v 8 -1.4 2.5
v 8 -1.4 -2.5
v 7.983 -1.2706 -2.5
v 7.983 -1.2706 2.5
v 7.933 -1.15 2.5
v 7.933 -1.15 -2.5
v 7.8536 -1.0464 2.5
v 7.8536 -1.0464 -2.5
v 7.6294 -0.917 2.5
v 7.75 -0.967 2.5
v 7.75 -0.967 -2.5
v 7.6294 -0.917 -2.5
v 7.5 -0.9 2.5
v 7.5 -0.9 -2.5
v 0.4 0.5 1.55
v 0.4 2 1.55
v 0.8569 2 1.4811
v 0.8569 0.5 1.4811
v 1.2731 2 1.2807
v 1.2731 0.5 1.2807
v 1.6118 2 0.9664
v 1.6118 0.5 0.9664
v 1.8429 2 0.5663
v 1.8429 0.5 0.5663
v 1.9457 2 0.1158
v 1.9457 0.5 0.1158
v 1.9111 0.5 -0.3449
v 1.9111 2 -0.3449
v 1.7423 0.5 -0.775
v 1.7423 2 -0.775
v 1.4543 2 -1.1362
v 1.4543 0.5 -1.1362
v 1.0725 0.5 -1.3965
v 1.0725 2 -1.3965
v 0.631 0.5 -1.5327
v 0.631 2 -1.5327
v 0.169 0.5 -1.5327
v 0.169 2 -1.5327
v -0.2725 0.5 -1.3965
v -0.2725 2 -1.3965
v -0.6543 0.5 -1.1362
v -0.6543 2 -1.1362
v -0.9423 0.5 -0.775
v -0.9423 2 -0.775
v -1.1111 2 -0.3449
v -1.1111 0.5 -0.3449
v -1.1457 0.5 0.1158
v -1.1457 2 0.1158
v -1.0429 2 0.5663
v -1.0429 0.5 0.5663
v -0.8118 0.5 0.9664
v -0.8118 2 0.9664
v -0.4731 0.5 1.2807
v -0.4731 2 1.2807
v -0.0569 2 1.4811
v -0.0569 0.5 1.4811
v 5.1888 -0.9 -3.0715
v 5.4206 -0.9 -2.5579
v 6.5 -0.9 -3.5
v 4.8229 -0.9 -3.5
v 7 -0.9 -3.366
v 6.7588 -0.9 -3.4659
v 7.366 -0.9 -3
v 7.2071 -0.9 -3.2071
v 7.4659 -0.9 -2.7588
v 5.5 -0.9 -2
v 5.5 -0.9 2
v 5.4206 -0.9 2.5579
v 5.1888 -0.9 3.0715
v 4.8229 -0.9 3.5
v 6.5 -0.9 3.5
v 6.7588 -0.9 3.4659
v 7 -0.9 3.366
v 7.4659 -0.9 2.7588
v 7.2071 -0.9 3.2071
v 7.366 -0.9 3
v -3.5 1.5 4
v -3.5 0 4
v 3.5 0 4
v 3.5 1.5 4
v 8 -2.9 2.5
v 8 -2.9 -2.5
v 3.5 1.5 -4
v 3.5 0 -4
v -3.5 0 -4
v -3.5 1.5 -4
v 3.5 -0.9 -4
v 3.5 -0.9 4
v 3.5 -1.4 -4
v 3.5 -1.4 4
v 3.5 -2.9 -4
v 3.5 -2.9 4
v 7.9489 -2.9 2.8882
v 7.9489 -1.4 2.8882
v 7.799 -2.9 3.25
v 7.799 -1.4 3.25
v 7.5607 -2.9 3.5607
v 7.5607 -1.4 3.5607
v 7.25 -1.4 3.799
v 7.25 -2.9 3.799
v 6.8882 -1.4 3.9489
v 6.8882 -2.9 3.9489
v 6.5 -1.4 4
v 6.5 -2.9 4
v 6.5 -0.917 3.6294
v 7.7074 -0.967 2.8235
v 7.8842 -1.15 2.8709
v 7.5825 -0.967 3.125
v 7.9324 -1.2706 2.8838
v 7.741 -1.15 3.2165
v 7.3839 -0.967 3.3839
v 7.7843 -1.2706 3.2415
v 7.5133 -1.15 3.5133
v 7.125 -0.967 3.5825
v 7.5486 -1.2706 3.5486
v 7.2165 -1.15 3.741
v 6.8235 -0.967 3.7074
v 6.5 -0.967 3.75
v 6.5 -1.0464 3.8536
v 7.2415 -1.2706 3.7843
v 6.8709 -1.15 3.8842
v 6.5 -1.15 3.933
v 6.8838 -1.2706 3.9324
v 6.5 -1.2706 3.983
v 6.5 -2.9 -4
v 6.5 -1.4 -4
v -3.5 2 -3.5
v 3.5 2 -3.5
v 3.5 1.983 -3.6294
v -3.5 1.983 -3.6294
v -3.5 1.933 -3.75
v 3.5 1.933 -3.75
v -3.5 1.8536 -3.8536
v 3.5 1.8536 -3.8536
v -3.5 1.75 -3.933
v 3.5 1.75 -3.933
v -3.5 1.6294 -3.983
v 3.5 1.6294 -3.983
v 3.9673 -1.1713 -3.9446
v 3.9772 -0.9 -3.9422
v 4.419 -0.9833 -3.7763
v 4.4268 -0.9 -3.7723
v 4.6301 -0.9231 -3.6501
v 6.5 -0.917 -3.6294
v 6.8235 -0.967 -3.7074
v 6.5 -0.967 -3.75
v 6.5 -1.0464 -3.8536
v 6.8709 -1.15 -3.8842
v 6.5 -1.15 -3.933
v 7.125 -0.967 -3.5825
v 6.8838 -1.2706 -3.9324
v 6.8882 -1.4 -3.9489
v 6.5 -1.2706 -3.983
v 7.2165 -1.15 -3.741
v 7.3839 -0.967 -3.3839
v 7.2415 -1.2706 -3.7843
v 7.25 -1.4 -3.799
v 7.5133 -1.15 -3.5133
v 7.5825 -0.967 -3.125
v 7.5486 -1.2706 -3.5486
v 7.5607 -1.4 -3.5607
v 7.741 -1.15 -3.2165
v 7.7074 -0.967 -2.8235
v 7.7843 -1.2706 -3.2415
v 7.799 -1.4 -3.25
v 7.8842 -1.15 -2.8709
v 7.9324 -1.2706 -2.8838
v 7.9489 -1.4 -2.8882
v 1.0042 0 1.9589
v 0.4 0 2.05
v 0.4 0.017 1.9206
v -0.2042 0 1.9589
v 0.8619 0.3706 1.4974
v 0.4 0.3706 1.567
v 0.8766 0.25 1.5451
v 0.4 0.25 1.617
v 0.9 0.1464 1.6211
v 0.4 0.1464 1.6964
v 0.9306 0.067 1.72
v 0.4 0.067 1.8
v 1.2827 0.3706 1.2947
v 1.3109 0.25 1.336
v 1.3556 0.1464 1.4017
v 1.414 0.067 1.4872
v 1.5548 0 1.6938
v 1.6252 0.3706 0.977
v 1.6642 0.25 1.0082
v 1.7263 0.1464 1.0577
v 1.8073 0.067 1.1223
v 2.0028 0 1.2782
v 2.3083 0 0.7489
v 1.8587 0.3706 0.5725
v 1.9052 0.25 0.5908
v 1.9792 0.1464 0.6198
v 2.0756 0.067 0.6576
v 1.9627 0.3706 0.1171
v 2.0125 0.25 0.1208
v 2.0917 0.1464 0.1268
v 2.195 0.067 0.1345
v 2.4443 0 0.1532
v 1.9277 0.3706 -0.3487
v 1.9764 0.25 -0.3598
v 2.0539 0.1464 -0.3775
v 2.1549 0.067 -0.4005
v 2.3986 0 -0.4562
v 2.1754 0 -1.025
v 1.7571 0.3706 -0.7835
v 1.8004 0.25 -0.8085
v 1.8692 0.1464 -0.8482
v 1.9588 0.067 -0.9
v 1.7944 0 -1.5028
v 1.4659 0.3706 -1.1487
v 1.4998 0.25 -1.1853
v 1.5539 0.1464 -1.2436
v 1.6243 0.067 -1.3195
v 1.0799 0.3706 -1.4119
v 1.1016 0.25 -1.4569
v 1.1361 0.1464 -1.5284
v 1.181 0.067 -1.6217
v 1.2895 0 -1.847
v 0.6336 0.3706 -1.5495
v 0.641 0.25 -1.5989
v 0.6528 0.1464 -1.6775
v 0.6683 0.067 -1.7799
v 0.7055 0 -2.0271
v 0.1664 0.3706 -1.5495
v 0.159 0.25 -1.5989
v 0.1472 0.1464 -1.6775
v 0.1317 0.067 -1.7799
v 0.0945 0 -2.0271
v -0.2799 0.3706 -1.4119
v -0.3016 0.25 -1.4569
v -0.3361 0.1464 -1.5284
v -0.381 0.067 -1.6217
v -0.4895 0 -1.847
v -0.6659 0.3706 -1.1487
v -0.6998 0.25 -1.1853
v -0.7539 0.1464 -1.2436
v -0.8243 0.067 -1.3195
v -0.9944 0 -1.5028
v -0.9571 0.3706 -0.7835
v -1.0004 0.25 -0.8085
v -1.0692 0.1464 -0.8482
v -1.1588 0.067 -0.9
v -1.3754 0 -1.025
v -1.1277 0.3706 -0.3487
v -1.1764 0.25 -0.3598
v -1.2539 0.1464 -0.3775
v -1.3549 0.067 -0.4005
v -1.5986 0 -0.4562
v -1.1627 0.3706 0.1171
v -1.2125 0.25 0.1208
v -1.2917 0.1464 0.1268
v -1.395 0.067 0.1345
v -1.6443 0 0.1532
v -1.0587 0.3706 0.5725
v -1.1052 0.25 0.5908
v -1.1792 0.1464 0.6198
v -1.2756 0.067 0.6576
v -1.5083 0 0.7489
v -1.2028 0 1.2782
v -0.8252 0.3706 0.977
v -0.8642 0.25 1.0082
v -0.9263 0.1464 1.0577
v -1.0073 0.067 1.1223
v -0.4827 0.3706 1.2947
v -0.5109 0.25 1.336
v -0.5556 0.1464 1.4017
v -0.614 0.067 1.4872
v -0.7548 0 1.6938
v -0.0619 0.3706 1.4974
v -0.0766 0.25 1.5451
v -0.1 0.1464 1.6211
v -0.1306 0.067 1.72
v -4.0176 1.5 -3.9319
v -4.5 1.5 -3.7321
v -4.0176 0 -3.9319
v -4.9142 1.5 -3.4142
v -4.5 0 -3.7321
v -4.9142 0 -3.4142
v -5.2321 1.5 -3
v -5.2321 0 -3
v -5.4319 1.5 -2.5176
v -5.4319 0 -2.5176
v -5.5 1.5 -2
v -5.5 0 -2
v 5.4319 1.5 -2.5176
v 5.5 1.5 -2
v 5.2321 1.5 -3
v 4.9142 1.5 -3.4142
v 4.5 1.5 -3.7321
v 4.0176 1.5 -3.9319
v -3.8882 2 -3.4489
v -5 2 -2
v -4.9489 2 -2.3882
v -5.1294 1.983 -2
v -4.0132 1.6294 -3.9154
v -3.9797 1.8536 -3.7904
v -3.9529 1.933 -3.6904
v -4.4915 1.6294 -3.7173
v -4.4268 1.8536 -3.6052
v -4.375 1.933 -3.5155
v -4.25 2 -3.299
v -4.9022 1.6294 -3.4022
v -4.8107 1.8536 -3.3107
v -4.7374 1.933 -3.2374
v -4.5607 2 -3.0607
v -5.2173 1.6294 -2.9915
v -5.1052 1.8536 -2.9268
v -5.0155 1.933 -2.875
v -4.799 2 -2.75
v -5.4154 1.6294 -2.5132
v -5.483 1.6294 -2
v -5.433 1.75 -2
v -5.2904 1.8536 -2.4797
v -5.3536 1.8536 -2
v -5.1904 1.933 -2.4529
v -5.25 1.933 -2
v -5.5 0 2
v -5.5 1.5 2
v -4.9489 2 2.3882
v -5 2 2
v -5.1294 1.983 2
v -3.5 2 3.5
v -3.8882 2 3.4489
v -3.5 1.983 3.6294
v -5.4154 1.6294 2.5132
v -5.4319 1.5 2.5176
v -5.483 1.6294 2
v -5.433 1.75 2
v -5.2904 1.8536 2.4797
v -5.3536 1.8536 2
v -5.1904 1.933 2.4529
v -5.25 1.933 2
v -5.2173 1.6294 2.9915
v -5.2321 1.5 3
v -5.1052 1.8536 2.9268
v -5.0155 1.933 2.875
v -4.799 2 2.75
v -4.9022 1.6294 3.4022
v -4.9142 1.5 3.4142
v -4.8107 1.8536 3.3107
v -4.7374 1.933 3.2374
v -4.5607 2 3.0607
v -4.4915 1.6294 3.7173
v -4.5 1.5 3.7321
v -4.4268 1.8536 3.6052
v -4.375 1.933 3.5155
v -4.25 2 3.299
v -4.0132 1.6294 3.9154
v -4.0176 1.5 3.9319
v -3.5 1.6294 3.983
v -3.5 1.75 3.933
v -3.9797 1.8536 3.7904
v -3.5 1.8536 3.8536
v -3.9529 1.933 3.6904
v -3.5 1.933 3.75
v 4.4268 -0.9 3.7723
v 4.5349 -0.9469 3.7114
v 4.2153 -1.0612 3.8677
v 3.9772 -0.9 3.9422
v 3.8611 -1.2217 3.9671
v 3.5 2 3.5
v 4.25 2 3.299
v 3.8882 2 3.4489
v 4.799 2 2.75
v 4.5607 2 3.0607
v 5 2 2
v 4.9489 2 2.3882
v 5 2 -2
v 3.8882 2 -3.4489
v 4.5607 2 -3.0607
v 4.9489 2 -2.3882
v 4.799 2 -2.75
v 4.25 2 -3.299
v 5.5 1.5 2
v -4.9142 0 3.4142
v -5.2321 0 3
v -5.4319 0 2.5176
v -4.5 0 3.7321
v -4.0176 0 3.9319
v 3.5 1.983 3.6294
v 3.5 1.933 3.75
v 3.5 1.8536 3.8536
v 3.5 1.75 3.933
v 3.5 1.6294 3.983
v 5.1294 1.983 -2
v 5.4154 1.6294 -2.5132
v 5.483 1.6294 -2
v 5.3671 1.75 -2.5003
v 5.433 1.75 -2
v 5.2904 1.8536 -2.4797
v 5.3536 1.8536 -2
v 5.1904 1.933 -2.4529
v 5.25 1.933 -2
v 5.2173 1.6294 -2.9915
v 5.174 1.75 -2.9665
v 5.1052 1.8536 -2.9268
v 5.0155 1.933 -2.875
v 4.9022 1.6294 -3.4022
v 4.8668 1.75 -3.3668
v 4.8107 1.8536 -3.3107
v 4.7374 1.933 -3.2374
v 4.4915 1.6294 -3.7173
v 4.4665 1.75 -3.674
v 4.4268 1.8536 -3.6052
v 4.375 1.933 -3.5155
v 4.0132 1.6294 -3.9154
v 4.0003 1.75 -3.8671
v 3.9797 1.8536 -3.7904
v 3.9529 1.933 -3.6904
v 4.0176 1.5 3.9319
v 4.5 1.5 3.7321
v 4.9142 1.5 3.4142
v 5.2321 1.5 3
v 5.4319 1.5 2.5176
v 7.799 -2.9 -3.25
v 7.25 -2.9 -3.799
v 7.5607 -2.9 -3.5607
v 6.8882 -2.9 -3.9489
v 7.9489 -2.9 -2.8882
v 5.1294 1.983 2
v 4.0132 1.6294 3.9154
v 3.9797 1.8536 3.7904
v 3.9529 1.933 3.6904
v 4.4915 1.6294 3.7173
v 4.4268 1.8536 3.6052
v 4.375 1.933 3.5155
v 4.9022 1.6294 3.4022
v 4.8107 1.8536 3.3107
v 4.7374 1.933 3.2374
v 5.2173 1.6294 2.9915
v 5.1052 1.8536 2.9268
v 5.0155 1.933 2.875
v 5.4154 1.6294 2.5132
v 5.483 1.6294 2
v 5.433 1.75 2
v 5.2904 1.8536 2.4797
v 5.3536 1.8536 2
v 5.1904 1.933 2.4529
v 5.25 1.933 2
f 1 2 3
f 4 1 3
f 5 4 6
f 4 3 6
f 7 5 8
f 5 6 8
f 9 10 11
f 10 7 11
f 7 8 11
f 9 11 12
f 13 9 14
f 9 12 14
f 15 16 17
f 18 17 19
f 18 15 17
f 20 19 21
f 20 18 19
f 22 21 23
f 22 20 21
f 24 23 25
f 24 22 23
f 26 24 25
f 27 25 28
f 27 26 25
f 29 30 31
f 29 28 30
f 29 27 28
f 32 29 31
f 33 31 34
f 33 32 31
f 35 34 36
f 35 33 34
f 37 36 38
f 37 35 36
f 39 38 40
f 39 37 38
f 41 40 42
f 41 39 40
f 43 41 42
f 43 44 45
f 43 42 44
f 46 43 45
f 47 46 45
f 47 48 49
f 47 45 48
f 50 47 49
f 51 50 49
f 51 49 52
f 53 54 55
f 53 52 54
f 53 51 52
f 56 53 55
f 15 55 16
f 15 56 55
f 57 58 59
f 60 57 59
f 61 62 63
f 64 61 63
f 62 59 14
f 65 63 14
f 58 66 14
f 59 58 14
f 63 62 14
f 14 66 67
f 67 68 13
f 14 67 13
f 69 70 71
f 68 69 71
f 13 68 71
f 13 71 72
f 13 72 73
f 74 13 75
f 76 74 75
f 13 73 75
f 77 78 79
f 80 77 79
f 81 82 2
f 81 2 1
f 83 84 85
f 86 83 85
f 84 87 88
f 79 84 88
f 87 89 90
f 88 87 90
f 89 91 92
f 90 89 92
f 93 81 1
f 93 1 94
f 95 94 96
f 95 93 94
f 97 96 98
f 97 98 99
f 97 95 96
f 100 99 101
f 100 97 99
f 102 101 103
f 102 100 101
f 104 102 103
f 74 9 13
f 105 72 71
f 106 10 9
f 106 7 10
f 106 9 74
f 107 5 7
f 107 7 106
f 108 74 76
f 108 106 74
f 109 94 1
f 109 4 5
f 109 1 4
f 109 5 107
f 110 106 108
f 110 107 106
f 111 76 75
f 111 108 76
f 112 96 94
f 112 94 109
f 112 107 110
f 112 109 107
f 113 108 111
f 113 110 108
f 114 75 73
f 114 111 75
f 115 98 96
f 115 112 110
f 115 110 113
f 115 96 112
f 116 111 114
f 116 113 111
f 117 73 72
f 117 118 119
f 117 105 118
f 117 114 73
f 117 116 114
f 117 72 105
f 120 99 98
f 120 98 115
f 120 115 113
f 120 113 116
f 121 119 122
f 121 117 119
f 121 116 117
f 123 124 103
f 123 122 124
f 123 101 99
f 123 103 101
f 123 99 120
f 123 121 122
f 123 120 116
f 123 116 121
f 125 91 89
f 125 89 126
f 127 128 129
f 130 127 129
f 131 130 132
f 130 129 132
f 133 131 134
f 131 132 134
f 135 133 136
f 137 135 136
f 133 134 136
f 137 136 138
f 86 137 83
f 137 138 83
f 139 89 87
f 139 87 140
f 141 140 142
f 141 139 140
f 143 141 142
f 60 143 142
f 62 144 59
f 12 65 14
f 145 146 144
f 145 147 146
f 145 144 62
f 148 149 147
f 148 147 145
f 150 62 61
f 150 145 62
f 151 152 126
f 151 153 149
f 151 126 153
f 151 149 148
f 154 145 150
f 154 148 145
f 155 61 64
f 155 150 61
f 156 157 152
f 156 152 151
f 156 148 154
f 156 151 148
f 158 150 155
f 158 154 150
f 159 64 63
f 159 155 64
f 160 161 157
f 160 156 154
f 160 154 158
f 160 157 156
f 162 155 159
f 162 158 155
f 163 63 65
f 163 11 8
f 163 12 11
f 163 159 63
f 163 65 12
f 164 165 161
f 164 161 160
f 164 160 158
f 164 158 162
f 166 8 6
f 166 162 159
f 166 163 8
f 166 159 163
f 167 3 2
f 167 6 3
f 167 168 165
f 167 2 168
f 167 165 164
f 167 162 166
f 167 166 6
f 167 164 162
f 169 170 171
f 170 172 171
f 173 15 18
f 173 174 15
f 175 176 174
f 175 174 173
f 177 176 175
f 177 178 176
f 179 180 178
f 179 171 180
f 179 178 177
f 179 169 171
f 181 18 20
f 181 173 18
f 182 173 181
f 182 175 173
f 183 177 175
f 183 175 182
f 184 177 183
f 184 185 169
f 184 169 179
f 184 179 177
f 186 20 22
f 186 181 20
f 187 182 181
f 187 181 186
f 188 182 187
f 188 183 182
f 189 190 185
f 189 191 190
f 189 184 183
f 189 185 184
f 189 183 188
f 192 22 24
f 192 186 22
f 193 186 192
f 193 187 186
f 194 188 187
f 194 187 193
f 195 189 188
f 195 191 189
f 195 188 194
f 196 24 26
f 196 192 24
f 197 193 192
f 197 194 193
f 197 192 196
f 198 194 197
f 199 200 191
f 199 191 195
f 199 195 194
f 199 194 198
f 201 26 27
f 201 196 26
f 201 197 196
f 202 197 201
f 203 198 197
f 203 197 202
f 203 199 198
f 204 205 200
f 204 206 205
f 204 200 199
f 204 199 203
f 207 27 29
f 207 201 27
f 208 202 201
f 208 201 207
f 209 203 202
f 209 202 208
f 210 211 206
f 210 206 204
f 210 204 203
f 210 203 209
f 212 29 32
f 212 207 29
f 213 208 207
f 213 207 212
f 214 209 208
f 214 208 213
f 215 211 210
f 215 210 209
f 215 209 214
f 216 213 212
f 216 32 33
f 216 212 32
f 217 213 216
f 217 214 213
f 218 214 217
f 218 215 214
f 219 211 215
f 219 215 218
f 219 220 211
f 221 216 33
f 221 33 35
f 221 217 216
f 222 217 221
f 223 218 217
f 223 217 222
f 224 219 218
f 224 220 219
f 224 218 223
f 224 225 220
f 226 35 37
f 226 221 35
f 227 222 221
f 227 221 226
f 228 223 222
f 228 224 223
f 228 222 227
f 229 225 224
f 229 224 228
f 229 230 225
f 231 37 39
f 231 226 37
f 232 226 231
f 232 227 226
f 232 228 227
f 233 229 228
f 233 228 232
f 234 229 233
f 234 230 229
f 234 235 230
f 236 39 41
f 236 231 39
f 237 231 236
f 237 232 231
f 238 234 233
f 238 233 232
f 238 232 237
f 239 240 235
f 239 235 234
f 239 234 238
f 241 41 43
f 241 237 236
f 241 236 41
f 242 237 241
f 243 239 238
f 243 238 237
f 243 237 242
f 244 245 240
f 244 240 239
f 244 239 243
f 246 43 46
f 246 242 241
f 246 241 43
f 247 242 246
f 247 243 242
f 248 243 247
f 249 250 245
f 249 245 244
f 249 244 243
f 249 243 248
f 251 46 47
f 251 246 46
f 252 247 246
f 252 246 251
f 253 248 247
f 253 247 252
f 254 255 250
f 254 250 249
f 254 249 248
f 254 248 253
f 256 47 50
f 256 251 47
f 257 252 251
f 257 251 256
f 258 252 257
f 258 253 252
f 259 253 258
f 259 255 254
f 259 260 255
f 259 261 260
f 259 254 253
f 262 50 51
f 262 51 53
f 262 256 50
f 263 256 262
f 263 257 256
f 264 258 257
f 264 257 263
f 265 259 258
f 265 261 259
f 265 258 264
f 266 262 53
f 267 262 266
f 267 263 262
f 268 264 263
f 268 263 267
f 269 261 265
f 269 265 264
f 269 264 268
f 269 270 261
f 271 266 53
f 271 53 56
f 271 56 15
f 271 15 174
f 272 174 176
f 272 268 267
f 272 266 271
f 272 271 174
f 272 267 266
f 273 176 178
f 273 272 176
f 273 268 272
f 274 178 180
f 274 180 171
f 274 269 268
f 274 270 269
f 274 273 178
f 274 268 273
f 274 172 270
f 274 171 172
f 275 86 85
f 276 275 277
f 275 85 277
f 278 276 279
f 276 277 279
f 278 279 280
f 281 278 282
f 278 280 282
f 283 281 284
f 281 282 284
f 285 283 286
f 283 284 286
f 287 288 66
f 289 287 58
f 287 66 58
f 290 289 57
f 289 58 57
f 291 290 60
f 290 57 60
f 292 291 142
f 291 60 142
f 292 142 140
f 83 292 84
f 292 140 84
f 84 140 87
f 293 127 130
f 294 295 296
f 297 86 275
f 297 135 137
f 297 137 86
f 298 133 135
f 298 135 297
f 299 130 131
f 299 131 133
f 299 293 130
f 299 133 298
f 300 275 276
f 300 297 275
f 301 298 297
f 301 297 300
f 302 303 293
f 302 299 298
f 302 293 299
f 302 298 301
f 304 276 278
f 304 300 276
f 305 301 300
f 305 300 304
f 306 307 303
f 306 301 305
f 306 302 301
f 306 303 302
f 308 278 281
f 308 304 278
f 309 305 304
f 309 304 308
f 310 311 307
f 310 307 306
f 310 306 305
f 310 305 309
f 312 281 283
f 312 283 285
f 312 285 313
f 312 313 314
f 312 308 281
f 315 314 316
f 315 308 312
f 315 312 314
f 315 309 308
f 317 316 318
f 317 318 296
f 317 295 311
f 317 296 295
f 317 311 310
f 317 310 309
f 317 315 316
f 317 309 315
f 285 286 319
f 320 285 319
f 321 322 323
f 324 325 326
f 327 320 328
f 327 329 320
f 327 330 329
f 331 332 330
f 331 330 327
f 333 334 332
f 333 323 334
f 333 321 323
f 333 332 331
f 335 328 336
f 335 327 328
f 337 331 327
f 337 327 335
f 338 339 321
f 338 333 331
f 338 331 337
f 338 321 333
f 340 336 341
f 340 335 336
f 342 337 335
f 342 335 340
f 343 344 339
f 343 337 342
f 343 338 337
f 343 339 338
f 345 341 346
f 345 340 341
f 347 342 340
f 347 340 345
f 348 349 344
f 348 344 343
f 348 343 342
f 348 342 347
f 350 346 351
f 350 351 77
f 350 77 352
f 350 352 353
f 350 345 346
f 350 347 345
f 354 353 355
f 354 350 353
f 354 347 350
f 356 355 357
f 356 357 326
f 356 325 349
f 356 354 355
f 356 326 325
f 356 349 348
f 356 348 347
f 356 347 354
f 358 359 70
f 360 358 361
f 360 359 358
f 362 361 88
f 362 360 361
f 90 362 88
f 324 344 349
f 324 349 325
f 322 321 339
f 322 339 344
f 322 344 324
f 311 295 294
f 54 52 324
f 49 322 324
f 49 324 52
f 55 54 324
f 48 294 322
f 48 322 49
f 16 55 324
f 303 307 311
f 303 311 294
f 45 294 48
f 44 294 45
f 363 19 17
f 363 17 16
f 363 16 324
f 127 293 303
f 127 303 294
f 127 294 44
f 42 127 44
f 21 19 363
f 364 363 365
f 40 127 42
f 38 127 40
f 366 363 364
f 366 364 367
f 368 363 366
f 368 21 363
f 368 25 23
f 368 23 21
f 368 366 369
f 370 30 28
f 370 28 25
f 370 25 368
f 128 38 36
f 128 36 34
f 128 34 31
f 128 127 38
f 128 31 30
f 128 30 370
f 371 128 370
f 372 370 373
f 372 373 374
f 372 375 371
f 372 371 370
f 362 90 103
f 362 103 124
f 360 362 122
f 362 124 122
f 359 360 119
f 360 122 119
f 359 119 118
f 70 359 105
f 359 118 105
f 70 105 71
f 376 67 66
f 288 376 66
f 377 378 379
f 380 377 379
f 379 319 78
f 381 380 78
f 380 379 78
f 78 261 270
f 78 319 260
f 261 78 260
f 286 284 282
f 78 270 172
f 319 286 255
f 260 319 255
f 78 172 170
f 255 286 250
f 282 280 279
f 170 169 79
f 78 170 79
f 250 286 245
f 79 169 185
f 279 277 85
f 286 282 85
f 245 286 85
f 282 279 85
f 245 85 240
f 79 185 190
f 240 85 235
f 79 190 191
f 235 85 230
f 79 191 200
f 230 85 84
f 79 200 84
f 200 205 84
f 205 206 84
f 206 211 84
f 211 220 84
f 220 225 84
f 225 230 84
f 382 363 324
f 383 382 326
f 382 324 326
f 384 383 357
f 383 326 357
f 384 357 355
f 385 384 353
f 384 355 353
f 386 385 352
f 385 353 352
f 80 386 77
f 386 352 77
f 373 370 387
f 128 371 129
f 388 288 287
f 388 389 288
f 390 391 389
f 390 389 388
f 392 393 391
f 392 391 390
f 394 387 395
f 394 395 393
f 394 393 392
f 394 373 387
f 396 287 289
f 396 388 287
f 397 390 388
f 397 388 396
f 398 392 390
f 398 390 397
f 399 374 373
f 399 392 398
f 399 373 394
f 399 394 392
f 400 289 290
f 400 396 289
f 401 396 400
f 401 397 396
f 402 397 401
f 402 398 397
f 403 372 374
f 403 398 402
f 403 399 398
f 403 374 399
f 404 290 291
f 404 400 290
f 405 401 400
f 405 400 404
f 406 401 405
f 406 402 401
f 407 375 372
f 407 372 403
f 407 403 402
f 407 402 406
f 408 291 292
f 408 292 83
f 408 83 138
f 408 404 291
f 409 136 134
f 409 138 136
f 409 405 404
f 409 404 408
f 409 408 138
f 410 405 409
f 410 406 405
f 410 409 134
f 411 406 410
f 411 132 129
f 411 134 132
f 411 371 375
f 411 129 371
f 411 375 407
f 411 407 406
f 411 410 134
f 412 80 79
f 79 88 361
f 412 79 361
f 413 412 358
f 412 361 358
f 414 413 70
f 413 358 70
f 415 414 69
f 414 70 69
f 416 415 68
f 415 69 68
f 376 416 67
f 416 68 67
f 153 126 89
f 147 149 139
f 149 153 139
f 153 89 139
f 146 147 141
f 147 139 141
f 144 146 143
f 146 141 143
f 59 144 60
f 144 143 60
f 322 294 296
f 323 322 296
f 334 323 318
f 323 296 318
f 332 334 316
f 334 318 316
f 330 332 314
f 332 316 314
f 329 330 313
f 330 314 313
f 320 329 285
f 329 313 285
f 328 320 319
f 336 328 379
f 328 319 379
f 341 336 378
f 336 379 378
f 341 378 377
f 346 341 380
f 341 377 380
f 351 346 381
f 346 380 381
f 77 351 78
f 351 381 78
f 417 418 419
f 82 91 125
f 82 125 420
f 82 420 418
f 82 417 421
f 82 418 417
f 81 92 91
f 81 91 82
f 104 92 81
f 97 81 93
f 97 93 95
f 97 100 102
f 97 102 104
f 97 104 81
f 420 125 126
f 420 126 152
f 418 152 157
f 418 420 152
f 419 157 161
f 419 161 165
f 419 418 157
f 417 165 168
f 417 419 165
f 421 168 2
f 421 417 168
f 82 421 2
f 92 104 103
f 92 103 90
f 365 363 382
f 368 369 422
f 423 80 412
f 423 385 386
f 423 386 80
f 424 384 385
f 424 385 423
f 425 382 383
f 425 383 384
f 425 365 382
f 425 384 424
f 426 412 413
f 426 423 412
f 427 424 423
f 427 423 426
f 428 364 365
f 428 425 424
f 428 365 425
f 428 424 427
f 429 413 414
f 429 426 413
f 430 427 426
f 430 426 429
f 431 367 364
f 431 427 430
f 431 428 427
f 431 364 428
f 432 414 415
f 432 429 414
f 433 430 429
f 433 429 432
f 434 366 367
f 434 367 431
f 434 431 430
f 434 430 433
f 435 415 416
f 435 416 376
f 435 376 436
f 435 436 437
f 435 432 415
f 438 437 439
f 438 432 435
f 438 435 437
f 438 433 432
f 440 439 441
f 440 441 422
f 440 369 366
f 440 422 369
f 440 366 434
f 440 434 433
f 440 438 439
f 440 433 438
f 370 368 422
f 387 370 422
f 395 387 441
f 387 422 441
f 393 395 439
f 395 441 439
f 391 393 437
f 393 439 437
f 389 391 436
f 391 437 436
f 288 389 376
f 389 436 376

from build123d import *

# Parameters (mm, degrees)
BOSS_EXTRUDE1_DEPTH     = 2
CUT_EXTRUDE1_DEPTH      = 8.088723439
CUT_EXTRUDE1_DEPTH_BACK = 8.088723439
SKETCH2_R               = 1.55
BOSS_EXTRUDE2_START     = 2.9
BOSS_EXTRUDE2_DEPTH     = 2.9
BOSS_EXTRUDE3_DEPTH     = 2
FILLET1_R               = 0.5


with BuildPart() as part:
    # Sketch1 → Boss-Extrude1 (new body)
    with BuildSketch(Plane(origin=(0, 0, 0), x_dir=(1, 0, 0), z_dir=(0, 1, 0))):
        with BuildLine():
            Line((3.5, 4), (-3.5, 4))
            ThreePointArc((-3.5, 4), (-4.914213562, 3.414213562), (-5.5, 2))
            Line((-5.5, 2), (-5.5, -2))
            ThreePointArc((-5.5, -2), (-4.914213562, -3.414213562), (-3.5, -4))
            Line((-3.5, -4), (3.5, -4))
            ThreePointArc((3.5, -4), (4.914213562, -3.414213562), (5.5, -2))
            Line((5.5, -2), (5.5, 2))
            ThreePointArc((5.5, 2), (4.914213562, 3.414213562), (3.5, 4))
        make_face()
    extrude(amount=BOSS_EXTRUDE1_DEPTH)

    # Sketch2 → Cut-Extrude1 (cut, two sides: drawn at the far end of the back side and taken through both)
    with BuildSketch(Plane(origin=(0, 2, 0), x_dir=(1, 0, 0), z_dir=(0, 1, 0)).offset(-CUT_EXTRUDE1_DEPTH_BACK)):
        with Locations(Location((0.4, 0, 0), (0, 0, 270))):
            Circle(SKETCH2_R)
    extrude(amount=CUT_EXTRUDE1_DEPTH + CUT_EXTRUDE1_DEPTH_BACK, mode=Mode.SUBTRACT)

    # Sketch3 → Boss-Extrude2 (add)
    with BuildSketch(Plane.XZ.offset(BOSS_EXTRUDE2_START)):
        with BuildLine():
            Line((5.5, 2), (5.5, -2))
            ThreePointArc((5.5, -2), (4.914213562, -3.414213562), (3.5, -4))
            Line((3.5, -4), (3.5, 4))
            ThreePointArc((3.5, 4), (4.914213562, 3.414213562), (5.5, 2))
        make_face()
    extrude(amount=-BOSS_EXTRUDE2_DEPTH)

    # Sketch4 → Boss-Extrude3 (add)
    with BuildSketch(Plane.XZ.offset(2.9)):
        with BuildLine():
            Line((5.5, 2), (5.5, -2))
            ThreePointArc((5.5, -2), (4.914213562, -3.414213562), (3.5, -4))
            Line((3.5, -4), (6.5, -4))
            ThreePointArc((6.5, -4), (7.560660172, -3.560660172), (8, -2.5))
            Line((8, -2.5), (8, 2.5))
            ThreePointArc((8, 2.5), (7.560660172, 3.560660172), (6.5, 4))
            Line((6.5, 4), (3.5, 4))
            ThreePointArc((3.5, 4), (4.914213562, 3.414213562), (5.5, 2))
        make_face()
    extrude(amount=-BOSS_EXTRUDE3_DEPTH)

    # Fillet1
    # the kernel refuses this fillet: 0.5 mm, written as the material it takes off along each edge
    with BuildSketch(Plane(origin=(-3.5, 2, 2), x_dir=(-1, 0, 0), z_dir=(0, 0, -1))) as fillet1_piece_1:
        with BuildLine():
            CenterArc((2 - FILLET1_R, -FILLET1_R), FILLET1_R, 0, 90)
            Line((2, -FILLET1_R), (2, 0))
            Line((2, 0), (2 - FILLET1_R, 0))
        make_face()
    revolve(axis=Axis((-3.5, 2, 2), (0, 1, 0)), revolution_arc=90, mode=Mode.SUBTRACT)
    with BuildSketch(Plane(origin=(-3.5, 2, 4), x_dir=(0, 0, -1), z_dir=(1, 0, 0)), Plane(origin=(3.5, 2, -4), x_dir=(0, 0, 1), z_dir=(-1, 0, 0))) as fillet1_piece_2:
        with BuildLine():
            CenterArc((FILLET1_R, -FILLET1_R), FILLET1_R, 90, 90)
            Line((0, -FILLET1_R), (0, 0))
            Line((0, 0), (FILLET1_R, 0))
        make_face()
    extrude(amount=7, mode=Mode.SUBTRACT)
    with BuildSketch(Plane(origin=(3.5, 2, 2), x_dir=(0, 0, 1), z_dir=(-1, 0, 0))) as fillet1_piece_3:
        with BuildLine():
            CenterArc((2 - FILLET1_R, -FILLET1_R), FILLET1_R, 0, 90)
            Line((2 - FILLET1_R, 0), (2, 0))
            Line((2, 0), (2, -FILLET1_R))
        make_face()
    revolve(axis=Axis((3.5, 2, 2), (0, 1, 0)), revolution_arc=90, mode=Mode.SUBTRACT)
    with BuildSketch(Plane(origin=(5.5, 2, 2), x_dir=(0, -1, 0), z_dir=(0, 0, -1))) as fillet1_piece_4:
        with BuildLine():
            CenterArc((FILLET1_R, FILLET1_R), FILLET1_R, 180, 90)
            Line((0, FILLET1_R), (0, 0))
            Line((0, 0), (FILLET1_R, 0))
        make_face()
    extrude(amount=4, mode=Mode.SUBTRACT)
    with BuildSketch(Plane(origin=(0.4, 0, 0), x_dir=(0, 0, 1), z_dir=(-1, 0, 0))) as fillet1_piece_5:
        with BuildLine():
            CenterArc((1.55 + FILLET1_R, FILLET1_R), FILLET1_R, 180, 90)
            Line((1.55 + FILLET1_R, 0), (1.55, 0))
            Line((1.55, 0), (1.55, FILLET1_R))
        make_face()
    revolve(axis=Axis((0.4, 0, 0), (0, 1, 0)), mode=Mode.SUBTRACT)
    with BuildSketch(Plane(origin=(3.5, 2, -2), x_dir=(1, 0, 0), z_dir=(0, 0, 1))) as fillet1_piece_6:
        with BuildLine():
            CenterArc((2 - FILLET1_R, -FILLET1_R), FILLET1_R, 0, 90)
            Line((2 - FILLET1_R, 0), (2, 0))
            Line((2, 0), (2, -FILLET1_R))
        make_face()
    revolve(axis=Axis((3.5, 2, -2), (0, 1, 0)), revolution_arc=90, mode=Mode.SUBTRACT)
    with BuildSketch(Plane(origin=(6.5, -0.9, 4), x_dir=(0, 0, -1), z_dir=(-1, 0, 0))) as fillet1_piece_7_section:
        with BuildLine():
            CenterArc((FILLET1_R, FILLET1_R), FILLET1_R, 180, 90)
            Line((0, FILLET1_R), (0, 0))
            Line((0, 0), (FILLET1_R, 0))
        make_face()
    fillet1_piece_7 = extrude(amount=4.25, mode=Mode.PRIVATE)
    fillet1_piece_7 = fillet1_piece_7 - Plane(origin=(3.5, -0.984531393, 2), x_dir=(0, 0, 1), z_dir=(0, -1, 0)) * Cylinder(2, 11, mode=Mode.PRIVATE)
    add(fillet1_piece_7, mode=Mode.SUBTRACT)
    with BuildSketch(Plane(origin=(6.5, -0.9, 2.5), x_dir=(1, 0, 0), z_dir=(0, 0, -1))) as fillet1_piece_8:
        with BuildLine():
            CenterArc((1.5 - FILLET1_R, FILLET1_R), FILLET1_R, 270, 90)
            Line((1.5, FILLET1_R), (1.5, 0))
            Line((1.5, 0), (1.5 - FILLET1_R, 0))
        make_face()
    revolve(axis=Axis((6.5, -0.9, 2.5), (0, -1, 0)), revolution_arc=90, mode=Mode.SUBTRACT)
    with BuildSketch(Plane(origin=(8, -0.9, -2.5), x_dir=(-1, 0, 0), z_dir=(0, 0, 1))) as fillet1_piece_9:
        with BuildLine():
            CenterArc((FILLET1_R, FILLET1_R), FILLET1_R, 180, 90)
            Line((0, FILLET1_R), (0, 0))
            Line((0, 0), (FILLET1_R, 0))
        make_face()
    extrude(amount=5, mode=Mode.SUBTRACT)
    with BuildSketch(Plane(origin=(6.5, -0.9, -2.5), x_dir=(0, 0, -1), z_dir=(-1, 0, 0))) as fillet1_piece_10:
        with BuildLine():
            CenterArc((1.5 - FILLET1_R, FILLET1_R), FILLET1_R, 270, 90)
            Line((1.5, FILLET1_R), (1.5, 0))
            Line((1.5, 0), (1.5 - FILLET1_R, 0))
        make_face()
    revolve(axis=Axis((6.5, -0.9, -2.5), (0, -1, 0)), revolution_arc=90, mode=Mode.SUBTRACT)
    with BuildSketch(Plane(origin=(2.25, -0.9, -4), x_dir=(0, 0, 1), z_dir=(1, 0, 0))) as fillet1_piece_11_section:
        with BuildLine():
            CenterArc((FILLET1_R, FILLET1_R), FILLET1_R, 180, 90)
            Line((0, FILLET1_R), (0, 0))
            Line((0, 0), (FILLET1_R, 0))
        make_face()
    fillet1_piece_11 = extrude(amount=4.25, mode=Mode.PRIVATE)
    fillet1_piece_11 = fillet1_piece_11 - Plane(origin=(3.5, -1.027464109, -2), x_dir=(1, 0, 0), z_dir=(0, -1, 0)) * Cylinder(2, 11, mode=Mode.PRIVATE)
    add(fillet1_piece_11, mode=Mode.SUBTRACT)
    with BuildSketch(Plane(origin=(-3.5, 2, -2), x_dir=(0, 0, -1), z_dir=(1, 0, 0))) as fillet1_piece_12:
        with BuildLine():
            CenterArc((2 - FILLET1_R, -FILLET1_R), FILLET1_R, 0, 90)
            Line((2, -FILLET1_R), (2, 0))
            Line((2, 0), (2 - FILLET1_R, 0))
        make_face()
    revolve(axis=Axis((-3.5, 2, -2), (0, 1, 0)), revolution_arc=90, mode=Mode.SUBTRACT)
    with BuildSketch(Plane(origin=(-5.5, 2, -2), x_dir=(1, 0, 0), z_dir=(0, 0, 1))) as fillet1_piece_13:
        with BuildLine():
            CenterArc((FILLET1_R, -FILLET1_R), FILLET1_R, 90, 90)
            Line((0, -FILLET1_R), (0, 0))
            Line((0, 0), (FILLET1_R, 0))
        make_face()
    extrude(amount=4, mode=Mode.SUBTRACT)


solid = part.part
